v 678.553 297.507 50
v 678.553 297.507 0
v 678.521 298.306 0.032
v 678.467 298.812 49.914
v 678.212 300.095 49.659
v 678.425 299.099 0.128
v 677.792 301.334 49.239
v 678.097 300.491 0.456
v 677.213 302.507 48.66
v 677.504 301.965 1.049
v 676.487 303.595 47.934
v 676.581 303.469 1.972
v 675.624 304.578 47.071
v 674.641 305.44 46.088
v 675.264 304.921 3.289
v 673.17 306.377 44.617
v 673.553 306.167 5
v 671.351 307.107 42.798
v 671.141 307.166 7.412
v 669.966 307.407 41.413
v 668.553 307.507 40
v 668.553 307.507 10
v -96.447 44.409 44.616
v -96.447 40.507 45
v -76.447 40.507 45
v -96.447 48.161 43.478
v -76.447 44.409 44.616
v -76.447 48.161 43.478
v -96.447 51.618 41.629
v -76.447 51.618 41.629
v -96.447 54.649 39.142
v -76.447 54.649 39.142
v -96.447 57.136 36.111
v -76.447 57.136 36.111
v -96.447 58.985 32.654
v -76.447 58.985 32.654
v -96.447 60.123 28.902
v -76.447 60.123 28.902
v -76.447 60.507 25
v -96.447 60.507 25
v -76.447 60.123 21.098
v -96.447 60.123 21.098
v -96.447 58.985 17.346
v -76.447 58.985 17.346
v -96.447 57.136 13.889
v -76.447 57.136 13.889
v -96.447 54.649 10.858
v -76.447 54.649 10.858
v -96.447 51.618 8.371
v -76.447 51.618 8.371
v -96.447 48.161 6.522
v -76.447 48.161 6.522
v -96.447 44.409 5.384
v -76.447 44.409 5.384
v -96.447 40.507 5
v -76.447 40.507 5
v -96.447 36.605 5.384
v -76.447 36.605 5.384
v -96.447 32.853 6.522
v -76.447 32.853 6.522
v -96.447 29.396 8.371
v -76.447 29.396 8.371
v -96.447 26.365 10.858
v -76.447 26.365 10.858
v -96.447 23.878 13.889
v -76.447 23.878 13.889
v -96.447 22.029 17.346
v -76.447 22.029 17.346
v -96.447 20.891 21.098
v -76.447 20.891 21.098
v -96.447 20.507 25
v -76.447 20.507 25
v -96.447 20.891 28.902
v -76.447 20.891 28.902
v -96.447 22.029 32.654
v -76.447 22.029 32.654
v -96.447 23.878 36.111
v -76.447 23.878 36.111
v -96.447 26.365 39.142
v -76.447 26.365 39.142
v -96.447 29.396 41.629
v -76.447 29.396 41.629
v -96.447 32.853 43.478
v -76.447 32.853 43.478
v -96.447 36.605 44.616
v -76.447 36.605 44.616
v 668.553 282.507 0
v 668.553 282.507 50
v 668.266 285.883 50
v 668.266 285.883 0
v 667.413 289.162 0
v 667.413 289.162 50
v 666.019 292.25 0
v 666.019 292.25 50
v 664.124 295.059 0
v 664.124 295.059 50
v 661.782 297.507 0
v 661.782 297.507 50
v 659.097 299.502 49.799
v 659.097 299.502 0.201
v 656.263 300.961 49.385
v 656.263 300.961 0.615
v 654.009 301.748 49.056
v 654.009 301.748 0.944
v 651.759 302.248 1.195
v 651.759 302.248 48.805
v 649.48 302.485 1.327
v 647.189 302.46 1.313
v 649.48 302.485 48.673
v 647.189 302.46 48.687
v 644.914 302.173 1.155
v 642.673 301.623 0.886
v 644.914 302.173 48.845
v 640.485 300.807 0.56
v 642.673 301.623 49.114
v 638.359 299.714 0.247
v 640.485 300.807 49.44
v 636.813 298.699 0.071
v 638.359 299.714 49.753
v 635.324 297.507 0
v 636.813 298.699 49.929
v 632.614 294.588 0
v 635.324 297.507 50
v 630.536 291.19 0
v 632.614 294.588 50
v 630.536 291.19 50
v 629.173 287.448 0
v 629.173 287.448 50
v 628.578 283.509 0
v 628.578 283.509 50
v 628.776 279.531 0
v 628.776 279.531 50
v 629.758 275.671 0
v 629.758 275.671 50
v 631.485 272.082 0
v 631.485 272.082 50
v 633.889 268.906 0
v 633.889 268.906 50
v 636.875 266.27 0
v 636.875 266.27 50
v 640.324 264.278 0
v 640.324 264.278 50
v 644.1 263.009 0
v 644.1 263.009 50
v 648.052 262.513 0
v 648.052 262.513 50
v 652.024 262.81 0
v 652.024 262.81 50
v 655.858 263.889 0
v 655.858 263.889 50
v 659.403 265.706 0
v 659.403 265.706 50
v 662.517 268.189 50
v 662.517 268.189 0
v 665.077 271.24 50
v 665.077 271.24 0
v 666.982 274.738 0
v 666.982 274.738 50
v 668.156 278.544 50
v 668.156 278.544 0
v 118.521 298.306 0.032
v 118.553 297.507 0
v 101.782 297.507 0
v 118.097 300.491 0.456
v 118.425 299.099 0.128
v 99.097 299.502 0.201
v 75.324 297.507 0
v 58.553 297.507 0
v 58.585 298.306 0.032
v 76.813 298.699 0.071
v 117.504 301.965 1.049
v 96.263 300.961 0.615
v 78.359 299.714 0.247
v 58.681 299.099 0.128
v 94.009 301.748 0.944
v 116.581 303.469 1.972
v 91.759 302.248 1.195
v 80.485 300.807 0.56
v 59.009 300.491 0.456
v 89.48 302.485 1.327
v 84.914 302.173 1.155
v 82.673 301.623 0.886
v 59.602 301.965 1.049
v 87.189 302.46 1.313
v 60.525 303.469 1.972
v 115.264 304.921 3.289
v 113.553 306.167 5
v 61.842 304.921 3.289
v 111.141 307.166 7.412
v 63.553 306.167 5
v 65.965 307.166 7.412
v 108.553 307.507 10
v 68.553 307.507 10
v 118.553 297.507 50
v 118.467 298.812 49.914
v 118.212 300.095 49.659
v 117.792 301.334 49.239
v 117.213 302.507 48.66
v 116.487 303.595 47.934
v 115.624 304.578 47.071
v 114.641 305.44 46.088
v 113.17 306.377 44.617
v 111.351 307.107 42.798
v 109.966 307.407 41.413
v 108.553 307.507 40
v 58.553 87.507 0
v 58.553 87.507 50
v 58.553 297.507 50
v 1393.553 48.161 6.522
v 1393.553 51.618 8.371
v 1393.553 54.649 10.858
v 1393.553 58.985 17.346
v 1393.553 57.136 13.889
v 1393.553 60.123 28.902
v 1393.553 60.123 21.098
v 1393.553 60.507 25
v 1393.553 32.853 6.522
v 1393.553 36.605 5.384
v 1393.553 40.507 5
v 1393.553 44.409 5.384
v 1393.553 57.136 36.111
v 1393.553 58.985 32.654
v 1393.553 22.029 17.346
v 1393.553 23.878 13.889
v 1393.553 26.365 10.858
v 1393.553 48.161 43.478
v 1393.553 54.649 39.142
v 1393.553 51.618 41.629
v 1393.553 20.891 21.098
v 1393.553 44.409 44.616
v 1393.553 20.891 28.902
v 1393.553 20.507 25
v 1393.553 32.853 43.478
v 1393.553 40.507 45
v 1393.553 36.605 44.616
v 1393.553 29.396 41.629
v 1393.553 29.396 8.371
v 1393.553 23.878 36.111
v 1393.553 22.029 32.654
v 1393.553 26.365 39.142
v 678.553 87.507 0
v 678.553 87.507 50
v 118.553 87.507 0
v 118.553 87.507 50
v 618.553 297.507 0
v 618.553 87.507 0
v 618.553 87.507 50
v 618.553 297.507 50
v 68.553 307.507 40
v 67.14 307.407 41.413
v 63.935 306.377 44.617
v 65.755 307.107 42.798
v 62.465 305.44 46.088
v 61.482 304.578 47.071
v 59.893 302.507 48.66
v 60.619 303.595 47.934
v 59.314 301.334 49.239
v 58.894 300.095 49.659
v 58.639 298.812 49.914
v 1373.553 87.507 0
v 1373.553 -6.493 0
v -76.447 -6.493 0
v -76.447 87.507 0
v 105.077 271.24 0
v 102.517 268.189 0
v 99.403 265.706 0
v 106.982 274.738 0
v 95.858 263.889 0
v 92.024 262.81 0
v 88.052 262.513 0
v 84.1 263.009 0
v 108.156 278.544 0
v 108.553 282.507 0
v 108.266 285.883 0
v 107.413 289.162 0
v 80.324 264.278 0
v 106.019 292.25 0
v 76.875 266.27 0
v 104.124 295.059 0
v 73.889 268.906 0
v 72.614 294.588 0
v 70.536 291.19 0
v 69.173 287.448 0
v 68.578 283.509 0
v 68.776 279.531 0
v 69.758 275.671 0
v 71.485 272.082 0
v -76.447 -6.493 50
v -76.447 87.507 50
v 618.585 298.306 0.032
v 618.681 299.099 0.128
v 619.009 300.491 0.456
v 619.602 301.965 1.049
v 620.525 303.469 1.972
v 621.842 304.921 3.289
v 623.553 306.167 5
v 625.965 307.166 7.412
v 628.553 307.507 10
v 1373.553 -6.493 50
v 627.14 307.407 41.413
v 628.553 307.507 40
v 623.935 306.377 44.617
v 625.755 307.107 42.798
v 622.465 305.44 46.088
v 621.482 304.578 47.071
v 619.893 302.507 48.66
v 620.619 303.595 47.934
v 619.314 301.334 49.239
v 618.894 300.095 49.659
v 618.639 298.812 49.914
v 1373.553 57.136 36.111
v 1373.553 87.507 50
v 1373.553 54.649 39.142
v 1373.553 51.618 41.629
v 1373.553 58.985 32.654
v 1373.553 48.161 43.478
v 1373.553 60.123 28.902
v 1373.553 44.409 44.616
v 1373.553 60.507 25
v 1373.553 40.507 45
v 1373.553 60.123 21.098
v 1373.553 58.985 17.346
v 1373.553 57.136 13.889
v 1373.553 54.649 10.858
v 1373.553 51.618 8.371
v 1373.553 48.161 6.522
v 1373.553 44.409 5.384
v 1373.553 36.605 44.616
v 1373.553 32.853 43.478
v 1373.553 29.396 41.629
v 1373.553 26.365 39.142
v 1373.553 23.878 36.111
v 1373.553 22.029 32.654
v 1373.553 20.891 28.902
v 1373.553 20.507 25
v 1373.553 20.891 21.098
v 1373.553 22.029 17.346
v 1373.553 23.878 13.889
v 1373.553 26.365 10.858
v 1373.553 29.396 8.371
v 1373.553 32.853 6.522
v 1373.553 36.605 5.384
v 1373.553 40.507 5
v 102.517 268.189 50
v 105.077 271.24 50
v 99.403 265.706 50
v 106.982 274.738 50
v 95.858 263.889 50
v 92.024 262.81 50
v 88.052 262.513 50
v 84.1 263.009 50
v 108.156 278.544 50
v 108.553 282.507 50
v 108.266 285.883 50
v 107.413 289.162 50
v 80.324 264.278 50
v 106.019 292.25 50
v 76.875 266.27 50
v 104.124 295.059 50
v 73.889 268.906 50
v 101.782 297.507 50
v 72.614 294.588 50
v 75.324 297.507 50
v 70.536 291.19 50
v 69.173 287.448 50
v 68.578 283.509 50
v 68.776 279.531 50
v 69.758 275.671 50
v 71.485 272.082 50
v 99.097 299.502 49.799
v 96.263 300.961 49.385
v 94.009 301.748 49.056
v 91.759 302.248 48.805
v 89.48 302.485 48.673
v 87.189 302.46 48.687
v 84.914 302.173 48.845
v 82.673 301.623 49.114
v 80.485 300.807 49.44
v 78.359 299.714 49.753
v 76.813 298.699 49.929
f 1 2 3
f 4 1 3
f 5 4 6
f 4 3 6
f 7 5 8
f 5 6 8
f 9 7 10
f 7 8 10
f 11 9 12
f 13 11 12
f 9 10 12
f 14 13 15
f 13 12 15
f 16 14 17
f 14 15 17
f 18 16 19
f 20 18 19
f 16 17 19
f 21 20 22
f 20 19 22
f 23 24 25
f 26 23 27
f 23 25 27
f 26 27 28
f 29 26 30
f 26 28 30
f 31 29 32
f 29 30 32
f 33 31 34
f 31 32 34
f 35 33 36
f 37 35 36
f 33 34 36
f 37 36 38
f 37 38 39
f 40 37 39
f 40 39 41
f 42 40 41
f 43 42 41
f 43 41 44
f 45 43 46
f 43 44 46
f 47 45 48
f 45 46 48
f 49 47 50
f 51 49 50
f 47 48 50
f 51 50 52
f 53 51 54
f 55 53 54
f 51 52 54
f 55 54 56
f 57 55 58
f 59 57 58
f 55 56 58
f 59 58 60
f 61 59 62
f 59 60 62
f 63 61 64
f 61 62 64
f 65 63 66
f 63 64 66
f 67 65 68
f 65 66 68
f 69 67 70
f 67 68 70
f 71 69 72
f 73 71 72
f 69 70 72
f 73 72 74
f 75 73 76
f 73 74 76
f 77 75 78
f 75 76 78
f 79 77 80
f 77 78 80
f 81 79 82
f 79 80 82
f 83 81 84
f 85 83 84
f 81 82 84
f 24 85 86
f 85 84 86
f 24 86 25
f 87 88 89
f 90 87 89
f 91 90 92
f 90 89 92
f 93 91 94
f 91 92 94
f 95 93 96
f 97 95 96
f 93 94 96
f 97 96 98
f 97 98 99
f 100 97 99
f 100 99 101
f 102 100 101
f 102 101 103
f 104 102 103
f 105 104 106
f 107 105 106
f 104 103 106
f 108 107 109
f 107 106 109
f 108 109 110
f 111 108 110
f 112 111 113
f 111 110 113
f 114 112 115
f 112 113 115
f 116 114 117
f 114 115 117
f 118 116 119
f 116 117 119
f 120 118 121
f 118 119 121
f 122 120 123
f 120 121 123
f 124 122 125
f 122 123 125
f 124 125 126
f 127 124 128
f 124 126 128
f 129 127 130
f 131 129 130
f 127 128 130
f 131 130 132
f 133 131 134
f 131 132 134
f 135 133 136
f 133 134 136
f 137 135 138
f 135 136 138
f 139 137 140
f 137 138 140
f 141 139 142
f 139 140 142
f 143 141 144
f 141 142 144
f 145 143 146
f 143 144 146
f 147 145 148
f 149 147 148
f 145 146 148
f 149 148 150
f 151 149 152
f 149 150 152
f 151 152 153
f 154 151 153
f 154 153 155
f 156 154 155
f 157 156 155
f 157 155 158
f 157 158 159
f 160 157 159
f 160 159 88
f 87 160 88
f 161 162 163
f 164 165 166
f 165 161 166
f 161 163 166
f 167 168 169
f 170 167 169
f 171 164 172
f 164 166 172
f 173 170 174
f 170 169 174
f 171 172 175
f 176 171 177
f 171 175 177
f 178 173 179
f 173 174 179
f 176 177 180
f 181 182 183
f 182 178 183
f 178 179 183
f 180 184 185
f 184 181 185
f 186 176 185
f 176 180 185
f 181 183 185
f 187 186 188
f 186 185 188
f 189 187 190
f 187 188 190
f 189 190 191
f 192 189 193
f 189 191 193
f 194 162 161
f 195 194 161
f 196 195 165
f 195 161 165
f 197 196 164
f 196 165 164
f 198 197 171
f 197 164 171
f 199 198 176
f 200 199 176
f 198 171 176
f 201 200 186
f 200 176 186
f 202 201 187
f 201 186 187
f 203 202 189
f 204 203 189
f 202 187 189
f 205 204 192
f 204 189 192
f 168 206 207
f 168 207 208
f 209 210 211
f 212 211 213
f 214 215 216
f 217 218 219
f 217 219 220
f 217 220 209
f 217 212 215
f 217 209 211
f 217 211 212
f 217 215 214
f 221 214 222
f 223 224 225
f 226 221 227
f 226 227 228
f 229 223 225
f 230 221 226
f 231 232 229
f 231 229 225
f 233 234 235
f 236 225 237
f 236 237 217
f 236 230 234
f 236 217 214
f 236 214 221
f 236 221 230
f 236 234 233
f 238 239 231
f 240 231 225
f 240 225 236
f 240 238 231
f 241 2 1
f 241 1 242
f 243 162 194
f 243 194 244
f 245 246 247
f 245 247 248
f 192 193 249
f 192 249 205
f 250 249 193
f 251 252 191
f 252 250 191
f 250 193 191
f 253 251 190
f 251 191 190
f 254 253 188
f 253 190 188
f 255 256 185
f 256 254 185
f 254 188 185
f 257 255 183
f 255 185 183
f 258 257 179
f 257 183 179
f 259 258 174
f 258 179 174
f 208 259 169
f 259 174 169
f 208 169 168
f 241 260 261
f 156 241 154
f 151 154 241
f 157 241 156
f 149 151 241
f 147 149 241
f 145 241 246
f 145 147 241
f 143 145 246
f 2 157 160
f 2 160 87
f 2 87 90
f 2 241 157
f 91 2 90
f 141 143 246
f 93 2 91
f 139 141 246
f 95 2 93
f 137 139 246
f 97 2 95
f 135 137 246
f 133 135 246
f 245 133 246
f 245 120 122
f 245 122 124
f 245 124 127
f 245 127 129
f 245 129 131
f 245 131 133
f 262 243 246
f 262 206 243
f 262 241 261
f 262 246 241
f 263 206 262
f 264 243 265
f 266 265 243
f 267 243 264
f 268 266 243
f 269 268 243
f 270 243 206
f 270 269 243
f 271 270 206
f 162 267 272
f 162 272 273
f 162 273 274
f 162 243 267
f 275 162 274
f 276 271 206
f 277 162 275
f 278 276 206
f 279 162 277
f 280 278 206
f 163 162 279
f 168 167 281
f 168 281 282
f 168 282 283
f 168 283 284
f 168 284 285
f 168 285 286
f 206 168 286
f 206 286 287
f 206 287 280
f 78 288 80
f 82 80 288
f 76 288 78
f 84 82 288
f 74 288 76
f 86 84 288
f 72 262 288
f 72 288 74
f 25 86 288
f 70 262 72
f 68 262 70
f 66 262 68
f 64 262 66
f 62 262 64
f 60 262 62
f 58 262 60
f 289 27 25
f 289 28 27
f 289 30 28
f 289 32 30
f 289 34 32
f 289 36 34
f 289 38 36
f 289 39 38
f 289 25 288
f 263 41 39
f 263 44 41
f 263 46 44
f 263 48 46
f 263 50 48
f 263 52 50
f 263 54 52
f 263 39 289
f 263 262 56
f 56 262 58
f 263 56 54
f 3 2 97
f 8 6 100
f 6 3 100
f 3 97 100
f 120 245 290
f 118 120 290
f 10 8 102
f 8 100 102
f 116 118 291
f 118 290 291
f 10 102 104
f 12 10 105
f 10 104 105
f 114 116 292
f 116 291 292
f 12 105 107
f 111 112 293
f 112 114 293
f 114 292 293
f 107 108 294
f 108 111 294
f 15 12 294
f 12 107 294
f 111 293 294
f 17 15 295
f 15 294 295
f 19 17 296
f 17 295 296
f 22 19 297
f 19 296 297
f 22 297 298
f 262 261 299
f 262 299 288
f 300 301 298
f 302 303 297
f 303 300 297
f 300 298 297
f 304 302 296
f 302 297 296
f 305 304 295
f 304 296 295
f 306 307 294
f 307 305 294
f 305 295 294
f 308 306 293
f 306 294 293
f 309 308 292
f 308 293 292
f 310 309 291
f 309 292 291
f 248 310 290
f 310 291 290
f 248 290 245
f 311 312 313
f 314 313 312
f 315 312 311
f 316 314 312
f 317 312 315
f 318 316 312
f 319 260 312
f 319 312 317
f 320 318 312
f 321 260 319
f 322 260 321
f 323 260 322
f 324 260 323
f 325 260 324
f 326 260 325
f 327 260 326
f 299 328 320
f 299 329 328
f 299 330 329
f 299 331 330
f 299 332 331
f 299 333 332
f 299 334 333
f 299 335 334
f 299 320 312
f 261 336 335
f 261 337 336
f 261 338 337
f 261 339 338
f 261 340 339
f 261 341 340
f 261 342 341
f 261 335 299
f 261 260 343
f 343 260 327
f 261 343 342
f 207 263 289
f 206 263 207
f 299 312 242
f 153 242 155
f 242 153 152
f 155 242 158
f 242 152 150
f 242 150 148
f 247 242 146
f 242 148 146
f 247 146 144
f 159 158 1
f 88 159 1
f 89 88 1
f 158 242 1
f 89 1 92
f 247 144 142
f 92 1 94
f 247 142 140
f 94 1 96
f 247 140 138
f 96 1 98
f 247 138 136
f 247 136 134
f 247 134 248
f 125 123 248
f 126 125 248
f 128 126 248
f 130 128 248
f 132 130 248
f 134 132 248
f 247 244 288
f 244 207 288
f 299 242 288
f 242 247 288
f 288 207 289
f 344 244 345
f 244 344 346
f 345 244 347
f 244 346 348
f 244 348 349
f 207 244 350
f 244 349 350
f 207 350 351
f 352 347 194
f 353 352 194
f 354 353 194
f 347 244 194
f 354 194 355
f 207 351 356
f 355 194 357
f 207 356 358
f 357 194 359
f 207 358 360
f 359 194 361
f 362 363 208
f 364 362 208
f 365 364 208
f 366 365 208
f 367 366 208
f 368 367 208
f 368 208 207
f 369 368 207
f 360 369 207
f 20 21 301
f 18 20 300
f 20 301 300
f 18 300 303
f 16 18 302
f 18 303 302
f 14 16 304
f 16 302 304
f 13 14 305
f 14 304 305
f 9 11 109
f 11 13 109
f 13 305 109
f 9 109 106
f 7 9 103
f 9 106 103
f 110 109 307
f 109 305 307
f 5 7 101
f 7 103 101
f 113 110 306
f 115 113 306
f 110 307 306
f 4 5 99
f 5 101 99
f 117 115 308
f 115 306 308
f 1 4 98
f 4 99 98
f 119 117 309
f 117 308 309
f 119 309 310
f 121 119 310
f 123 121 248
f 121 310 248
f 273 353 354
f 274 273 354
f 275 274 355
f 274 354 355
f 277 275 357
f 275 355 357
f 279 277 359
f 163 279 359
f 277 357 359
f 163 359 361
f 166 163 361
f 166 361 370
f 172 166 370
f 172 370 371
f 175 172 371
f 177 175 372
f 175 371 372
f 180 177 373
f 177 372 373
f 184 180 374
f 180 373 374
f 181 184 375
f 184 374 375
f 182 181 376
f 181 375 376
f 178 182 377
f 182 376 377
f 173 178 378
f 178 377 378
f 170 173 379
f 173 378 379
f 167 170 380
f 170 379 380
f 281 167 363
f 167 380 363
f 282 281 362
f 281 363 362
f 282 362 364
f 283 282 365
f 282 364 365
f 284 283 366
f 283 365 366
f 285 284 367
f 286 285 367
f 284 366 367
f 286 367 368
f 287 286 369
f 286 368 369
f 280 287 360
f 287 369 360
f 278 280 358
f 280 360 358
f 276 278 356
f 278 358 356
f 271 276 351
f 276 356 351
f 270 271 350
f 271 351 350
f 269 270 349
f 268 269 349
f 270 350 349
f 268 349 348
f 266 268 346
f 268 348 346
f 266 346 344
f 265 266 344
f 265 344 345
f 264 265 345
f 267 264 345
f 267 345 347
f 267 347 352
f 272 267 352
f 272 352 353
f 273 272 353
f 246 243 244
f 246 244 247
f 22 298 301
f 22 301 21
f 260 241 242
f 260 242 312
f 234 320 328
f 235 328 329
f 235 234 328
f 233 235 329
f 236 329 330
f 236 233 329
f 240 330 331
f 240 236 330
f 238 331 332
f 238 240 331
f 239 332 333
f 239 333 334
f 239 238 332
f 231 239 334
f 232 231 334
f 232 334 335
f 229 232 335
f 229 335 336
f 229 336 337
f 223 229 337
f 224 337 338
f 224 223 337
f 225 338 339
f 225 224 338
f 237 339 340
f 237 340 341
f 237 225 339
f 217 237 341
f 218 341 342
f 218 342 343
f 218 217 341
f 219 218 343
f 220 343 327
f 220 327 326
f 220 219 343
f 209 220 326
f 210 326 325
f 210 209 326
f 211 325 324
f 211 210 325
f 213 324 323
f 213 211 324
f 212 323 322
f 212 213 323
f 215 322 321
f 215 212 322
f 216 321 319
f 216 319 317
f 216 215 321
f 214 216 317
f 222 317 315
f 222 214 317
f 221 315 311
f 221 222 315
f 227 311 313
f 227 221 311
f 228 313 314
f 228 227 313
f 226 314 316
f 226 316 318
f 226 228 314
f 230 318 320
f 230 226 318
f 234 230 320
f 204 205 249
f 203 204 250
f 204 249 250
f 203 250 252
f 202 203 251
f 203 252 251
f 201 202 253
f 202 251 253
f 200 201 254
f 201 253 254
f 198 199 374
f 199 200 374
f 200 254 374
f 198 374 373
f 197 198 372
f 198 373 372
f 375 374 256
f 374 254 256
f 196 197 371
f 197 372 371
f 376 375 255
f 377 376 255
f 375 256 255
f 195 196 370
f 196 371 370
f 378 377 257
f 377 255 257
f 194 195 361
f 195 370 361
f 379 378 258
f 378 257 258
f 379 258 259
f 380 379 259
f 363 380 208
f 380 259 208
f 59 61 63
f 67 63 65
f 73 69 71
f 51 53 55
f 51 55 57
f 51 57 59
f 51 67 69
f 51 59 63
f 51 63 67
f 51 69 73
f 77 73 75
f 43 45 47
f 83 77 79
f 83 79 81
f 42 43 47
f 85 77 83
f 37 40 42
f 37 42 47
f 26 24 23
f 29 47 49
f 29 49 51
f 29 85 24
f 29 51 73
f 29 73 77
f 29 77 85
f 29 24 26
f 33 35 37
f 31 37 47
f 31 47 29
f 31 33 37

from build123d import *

# Parameters (mm, degrees)
BOSS_EXTRUDE1_DEPTH = 50
SKETCH2_R           = 20
BOSS_EXTRUDE2_DEPTH = 20
BOSS_EXTRUDE3_START = 20
SKETCH3_R           = 20
BOSS_EXTRUDE3_DEPTH = 20
SKETCH4_R           = 20
CUT_EXTRUDE1_DEPTH  = 70
SKETCH5_R           = 20
CUT_EXTRUDE2_DEPTH  = 70
FILLET1_R           = 10


with BuildPart() as part:
    # Sketch1 → Boss-Extrude1 (new body)
    with BuildSketch(Plane.XY):
        Polygon((-76.447024941, -6.493075274), (-76.447024941, 87.506924726), (58.552975059, 87.506924726), (58.552975059, 307.506924726), (118.552975059, 307.506924726), (118.552975059, 87.506924726), (618.552975059, 87.506924726), (618.552975059, 307.506924726), (678.552975059, 307.506924726), (678.552975059, 87.506924726), (1373.552975059, 87.506924726), (1373.552975059, -6.493075274), align=None)
    extrude(amount=BOSS_EXTRUDE1_DEPTH)

    # Sketch2 → Boss-Extrude2 (add)
    with BuildSketch(Plane.ZY.offset(76.447024941)):
        with Locations((25, 40.506924726)):
            Circle(SKETCH2_R)
    extrude(amount=BOSS_EXTRUDE2_DEPTH)

    # Sketch3 → Boss-Extrude3 (add)
    with BuildSketch(Plane(origin=(1373.552975059, 0, 0), x_dir=(0, 0, -1), z_dir=(1, 0, 0)).offset(BOSS_EXTRUDE3_START)):
        with Locations(Location((-25, 40.506924726, 0), (0, 0, 180))):
            Circle(SKETCH3_R)
    extrude(amount=-BOSS_EXTRUDE3_DEPTH)

    # Sketch4 → Cut-Extrude1 (cut)
    with BuildSketch(Plane.XY.offset(50)):
        with Locations((88.552975059, 282.506924726)):
            Circle(SKETCH4_R)
    extrude(amount=-CUT_EXTRUDE1_DEPTH, mode=Mode.SUBTRACT)

    # Sketch5 → Cut-Extrude2 (cut)
    with BuildSketch(Plane.XY.offset(50)):
        with Locations((648.552975059, 282.506924726)):
            Circle(SKETCH5_R)
    extrude(amount=-CUT_EXTRUDE2_DEPTH, mode=Mode.SUBTRACT)

    # Fillet1
    # the kernel refuses this fillet: 10 mm, written as the material it takes off along each edge
    with BuildSketch(Plane(origin=(33.552975059, 307.506924726, 0), x_dir=(0, -1, 0), z_dir=(1, 0, 0)), Plane(origin=(593.552975059, 307.506924726, 0), x_dir=(0, -1, 0), z_dir=(1, 0, 0))) as fillet1_piece_1:
        with BuildLine():
            CenterArc((FILLET1_R, -FILLET1_R), FILLET1_R, 90, 90)
            Line((0, -FILLET1_R), (0, 0))
            Line((0, 0), (FILLET1_R, 0))
        make_face()
    extrude(amount=110, mode=Mode.SUBTRACT)
    with BuildSketch(Plane(origin=(593.552975059, 307.506924726, 50), x_dir=(0, -1, 0), z_dir=(1, 0, 0)), Plane(origin=(33.552975059, 307.506924726, 50), x_dir=(0, -1, 0), z_dir=(1, 0, 0))) as fillet1_piece_2:
        with BuildLine():
            CenterArc((FILLET1_R, FILLET1_R), FILLET1_R, 180, 90)
            Line((0, FILLET1_R), (0, 0))
            Line((0, 0), (FILLET1_R, 0))
        make_face()
    extrude(amount=110, mode=Mode.SUBTRACT)
    with BuildSketch(Plane(origin=(58.552975059, 307.506924726, -25), x_dir=(0, -1, 0), z_dir=(0, 0, 1)), Plane(origin=(118.552975059, 307.506924726, -25), x_dir=(-1, 0, 0), z_dir=(0, 0, 1))) as fillet1_piece_3:
        with BuildLine():
            CenterArc((FILLET1_R, FILLET1_R), FILLET1_R, 180, 90)
            Line((0, FILLET1_R), (0, 0))
            Line((0, 0), (FILLET1_R, 0))
        make_face()
    extrude(amount=100, mode=Mode.SUBTRACT)
    with BuildSketch(Plane(origin=(618.552975059, 307.506924726, -25), x_dir=(1, 0, 0), z_dir=(0, 0, 1)), Plane(origin=(678.552975059, 307.506924726, -25), x_dir=(0, -1, 0), z_dir=(0, 0, 1))) as fillet1_piece_4:
        with BuildLine():
            CenterArc((FILLET1_R, -FILLET1_R), FILLET1_R, 90, 90)
            Line((0, -FILLET1_R), (0, 0))
            Line((0, 0), (FILLET1_R, 0))
        make_face()
    extrude(amount=100, mode=Mode.SUBTRACT)


solid = part.part
